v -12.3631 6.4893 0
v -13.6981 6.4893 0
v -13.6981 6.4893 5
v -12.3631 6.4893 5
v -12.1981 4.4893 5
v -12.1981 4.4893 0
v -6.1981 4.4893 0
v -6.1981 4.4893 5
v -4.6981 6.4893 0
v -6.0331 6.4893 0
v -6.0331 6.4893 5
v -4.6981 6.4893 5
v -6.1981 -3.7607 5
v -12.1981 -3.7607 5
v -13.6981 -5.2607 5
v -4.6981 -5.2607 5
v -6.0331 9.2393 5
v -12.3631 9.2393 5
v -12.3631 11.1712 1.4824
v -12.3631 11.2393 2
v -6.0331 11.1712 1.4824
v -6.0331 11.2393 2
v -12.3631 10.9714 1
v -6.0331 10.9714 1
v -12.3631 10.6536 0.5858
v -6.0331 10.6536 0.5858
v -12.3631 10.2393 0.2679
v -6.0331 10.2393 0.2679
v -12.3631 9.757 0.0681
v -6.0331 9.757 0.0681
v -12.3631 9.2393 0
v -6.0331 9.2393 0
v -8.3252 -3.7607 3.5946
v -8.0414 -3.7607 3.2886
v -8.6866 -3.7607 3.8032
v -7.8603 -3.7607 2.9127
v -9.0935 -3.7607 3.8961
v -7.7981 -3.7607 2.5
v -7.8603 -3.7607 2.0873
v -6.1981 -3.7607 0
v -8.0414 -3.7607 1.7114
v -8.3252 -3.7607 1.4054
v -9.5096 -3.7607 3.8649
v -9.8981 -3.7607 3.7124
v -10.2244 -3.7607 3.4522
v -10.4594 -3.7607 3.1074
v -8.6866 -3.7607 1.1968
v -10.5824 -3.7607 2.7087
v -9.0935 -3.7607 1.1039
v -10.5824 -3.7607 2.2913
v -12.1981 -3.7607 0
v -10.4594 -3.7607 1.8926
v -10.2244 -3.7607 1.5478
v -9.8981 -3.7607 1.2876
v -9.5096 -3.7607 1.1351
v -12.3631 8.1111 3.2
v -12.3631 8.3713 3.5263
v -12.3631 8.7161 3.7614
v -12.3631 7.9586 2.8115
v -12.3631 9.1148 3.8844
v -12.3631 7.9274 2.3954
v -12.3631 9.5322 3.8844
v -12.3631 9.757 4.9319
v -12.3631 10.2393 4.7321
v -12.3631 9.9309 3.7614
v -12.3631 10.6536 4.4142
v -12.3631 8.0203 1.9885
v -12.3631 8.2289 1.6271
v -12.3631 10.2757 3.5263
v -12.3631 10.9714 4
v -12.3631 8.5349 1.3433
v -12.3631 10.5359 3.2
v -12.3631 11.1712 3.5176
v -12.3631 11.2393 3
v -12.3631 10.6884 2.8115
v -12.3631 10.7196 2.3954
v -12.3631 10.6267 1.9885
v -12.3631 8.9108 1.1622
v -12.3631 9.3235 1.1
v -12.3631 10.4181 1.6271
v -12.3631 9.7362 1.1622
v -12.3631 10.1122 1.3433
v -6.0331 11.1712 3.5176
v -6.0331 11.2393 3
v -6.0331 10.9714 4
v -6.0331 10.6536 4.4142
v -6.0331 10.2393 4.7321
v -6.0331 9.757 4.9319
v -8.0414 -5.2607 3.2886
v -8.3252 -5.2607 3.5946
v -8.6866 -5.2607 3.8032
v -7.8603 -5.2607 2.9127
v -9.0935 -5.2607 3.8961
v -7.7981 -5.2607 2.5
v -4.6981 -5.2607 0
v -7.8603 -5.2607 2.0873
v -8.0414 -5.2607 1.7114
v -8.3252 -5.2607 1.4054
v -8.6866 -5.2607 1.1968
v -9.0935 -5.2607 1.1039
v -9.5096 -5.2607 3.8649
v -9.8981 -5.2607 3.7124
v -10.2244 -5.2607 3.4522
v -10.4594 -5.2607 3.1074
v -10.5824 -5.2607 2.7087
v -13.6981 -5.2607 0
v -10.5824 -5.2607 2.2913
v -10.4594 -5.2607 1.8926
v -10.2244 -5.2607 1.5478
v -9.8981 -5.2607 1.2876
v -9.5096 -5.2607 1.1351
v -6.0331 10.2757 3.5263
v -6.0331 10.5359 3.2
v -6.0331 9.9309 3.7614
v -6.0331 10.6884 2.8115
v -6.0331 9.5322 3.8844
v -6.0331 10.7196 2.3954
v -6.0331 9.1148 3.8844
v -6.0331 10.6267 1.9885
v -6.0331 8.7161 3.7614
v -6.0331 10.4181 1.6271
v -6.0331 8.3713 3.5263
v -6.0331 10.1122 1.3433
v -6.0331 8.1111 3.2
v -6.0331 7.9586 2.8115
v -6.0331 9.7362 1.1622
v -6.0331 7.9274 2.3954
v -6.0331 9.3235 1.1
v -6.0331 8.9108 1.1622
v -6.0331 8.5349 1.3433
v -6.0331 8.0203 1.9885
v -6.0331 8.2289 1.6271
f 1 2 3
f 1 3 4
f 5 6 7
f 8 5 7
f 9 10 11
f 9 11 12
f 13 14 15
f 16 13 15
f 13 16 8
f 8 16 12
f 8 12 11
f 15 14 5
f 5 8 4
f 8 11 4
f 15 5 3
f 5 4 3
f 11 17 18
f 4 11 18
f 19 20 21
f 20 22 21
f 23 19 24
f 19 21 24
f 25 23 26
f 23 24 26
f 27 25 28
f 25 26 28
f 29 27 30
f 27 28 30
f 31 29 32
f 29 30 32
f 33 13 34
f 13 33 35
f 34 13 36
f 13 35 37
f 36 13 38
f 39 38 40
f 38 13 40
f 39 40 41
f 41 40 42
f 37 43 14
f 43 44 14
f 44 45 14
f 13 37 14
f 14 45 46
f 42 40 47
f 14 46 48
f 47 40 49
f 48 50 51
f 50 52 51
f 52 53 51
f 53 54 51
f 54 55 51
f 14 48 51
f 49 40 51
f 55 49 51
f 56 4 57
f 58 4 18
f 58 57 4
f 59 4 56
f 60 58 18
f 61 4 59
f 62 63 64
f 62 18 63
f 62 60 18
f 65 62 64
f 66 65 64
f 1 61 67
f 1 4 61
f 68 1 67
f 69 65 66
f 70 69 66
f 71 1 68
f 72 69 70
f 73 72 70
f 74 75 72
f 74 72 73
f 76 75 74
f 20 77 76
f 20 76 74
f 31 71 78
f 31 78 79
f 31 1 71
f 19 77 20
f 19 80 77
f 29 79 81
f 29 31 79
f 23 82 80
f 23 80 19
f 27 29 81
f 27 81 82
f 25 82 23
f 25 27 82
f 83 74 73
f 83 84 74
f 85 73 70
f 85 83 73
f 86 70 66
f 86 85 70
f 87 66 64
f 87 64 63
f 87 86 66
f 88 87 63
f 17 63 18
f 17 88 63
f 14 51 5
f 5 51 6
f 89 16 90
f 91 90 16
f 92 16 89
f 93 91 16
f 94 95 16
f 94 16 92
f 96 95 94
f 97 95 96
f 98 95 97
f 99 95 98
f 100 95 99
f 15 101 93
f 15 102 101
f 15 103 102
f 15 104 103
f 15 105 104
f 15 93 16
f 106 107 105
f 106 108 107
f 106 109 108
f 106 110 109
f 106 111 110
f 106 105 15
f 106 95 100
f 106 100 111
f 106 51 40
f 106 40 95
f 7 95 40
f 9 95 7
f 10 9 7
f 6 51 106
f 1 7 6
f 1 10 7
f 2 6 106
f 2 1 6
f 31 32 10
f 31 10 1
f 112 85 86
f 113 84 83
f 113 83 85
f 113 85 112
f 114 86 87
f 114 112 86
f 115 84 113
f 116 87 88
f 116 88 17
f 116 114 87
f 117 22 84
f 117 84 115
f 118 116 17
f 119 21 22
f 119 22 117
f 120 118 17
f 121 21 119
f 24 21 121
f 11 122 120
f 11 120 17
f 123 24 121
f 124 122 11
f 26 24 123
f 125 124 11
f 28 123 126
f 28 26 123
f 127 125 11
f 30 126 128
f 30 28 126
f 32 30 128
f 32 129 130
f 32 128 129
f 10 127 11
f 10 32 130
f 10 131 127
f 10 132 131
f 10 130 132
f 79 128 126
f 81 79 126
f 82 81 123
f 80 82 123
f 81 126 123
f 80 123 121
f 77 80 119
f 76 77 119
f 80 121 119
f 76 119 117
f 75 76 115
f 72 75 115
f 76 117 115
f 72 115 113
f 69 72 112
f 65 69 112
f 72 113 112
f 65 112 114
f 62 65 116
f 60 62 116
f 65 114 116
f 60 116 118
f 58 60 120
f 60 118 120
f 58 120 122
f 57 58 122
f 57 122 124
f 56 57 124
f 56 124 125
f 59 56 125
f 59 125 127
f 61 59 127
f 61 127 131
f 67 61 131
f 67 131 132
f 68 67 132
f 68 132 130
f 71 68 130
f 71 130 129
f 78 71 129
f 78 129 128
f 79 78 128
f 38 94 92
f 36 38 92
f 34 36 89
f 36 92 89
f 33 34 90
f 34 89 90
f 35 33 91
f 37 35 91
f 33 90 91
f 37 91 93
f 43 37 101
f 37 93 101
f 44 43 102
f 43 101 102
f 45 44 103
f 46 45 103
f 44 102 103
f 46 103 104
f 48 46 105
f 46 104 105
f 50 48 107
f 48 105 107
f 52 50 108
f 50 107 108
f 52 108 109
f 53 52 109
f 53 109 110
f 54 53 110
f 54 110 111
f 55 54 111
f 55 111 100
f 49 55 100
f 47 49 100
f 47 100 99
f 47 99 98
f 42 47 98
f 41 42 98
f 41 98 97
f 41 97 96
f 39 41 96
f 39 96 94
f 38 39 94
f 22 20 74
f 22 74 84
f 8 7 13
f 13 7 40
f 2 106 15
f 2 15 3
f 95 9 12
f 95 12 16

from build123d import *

# Parameters (mm, degrees)
BOSS_EXTRUDE1_DEPTH = 5
SKETCH2_R           = 1.4
CUT_EXTRUDE1_DEPTH  = 8
SKETCH3_R           = 1.4
CUT_EXTRUDE2_DEPTH  = 6
FILLET1_R           = 2


with BuildPart() as part:
    # Sketch1 → Boss-Extrude1 (new body)
    with BuildSketch(Plane.XY):
        Polygon((-12.363085779, 11.239336475), (-6.033085779, 11.239336475), (-6.033085779, 6.489336475), (-4.698085779, 6.489336475), (-4.698085779, -5.260663525), (-13.698085779, -5.260663525), (-13.698085779, 6.489336475), (-12.363085779, 6.489336475), align=None)
        Polygon((-9.198085779, 4.489336475), (-6.198085779, 4.489336475), (-6.198085779, -3.760663525), (-12.198085779, -3.760663525), (-12.198085779, 4.489336475), align=None, mode=Mode.SUBTRACT)
    extrude(amount=BOSS_EXTRUDE1_DEPTH)

    # Sketch2 → Cut-Extrude1 (cut)
    with BuildSketch(Plane(origin=(-6.033085779, 0, 0), x_dir=(0, 0, -1), z_dir=(1, 0, 0))):
        with Locations((-2.5, 9.323502588)):
            Circle(SKETCH2_R)
    extrude(amount=-CUT_EXTRUDE1_DEPTH, mode=Mode.SUBTRACT)

    # Sketch3 → Cut-Extrude2 (cut)
    with BuildSketch(Plane.XZ.offset(5.260663525)):
        with Locations((-9.198085779, 2.5)):
            Circle(SKETCH3_R)
    extrude(amount=-CUT_EXTRUDE2_DEPTH, mode=Mode.SUBTRACT)

    # Fillet1
    fillet1_edges = [part.edges().sort_by_distance(p)[0] for p in [
        (-9.198085779, 11.239336475, 5),
        (-9.198085779, 11.239336475, 0),
    ]]
    fillet(fillet1_edges, radius=FILLET1_R)


solid = part.part
